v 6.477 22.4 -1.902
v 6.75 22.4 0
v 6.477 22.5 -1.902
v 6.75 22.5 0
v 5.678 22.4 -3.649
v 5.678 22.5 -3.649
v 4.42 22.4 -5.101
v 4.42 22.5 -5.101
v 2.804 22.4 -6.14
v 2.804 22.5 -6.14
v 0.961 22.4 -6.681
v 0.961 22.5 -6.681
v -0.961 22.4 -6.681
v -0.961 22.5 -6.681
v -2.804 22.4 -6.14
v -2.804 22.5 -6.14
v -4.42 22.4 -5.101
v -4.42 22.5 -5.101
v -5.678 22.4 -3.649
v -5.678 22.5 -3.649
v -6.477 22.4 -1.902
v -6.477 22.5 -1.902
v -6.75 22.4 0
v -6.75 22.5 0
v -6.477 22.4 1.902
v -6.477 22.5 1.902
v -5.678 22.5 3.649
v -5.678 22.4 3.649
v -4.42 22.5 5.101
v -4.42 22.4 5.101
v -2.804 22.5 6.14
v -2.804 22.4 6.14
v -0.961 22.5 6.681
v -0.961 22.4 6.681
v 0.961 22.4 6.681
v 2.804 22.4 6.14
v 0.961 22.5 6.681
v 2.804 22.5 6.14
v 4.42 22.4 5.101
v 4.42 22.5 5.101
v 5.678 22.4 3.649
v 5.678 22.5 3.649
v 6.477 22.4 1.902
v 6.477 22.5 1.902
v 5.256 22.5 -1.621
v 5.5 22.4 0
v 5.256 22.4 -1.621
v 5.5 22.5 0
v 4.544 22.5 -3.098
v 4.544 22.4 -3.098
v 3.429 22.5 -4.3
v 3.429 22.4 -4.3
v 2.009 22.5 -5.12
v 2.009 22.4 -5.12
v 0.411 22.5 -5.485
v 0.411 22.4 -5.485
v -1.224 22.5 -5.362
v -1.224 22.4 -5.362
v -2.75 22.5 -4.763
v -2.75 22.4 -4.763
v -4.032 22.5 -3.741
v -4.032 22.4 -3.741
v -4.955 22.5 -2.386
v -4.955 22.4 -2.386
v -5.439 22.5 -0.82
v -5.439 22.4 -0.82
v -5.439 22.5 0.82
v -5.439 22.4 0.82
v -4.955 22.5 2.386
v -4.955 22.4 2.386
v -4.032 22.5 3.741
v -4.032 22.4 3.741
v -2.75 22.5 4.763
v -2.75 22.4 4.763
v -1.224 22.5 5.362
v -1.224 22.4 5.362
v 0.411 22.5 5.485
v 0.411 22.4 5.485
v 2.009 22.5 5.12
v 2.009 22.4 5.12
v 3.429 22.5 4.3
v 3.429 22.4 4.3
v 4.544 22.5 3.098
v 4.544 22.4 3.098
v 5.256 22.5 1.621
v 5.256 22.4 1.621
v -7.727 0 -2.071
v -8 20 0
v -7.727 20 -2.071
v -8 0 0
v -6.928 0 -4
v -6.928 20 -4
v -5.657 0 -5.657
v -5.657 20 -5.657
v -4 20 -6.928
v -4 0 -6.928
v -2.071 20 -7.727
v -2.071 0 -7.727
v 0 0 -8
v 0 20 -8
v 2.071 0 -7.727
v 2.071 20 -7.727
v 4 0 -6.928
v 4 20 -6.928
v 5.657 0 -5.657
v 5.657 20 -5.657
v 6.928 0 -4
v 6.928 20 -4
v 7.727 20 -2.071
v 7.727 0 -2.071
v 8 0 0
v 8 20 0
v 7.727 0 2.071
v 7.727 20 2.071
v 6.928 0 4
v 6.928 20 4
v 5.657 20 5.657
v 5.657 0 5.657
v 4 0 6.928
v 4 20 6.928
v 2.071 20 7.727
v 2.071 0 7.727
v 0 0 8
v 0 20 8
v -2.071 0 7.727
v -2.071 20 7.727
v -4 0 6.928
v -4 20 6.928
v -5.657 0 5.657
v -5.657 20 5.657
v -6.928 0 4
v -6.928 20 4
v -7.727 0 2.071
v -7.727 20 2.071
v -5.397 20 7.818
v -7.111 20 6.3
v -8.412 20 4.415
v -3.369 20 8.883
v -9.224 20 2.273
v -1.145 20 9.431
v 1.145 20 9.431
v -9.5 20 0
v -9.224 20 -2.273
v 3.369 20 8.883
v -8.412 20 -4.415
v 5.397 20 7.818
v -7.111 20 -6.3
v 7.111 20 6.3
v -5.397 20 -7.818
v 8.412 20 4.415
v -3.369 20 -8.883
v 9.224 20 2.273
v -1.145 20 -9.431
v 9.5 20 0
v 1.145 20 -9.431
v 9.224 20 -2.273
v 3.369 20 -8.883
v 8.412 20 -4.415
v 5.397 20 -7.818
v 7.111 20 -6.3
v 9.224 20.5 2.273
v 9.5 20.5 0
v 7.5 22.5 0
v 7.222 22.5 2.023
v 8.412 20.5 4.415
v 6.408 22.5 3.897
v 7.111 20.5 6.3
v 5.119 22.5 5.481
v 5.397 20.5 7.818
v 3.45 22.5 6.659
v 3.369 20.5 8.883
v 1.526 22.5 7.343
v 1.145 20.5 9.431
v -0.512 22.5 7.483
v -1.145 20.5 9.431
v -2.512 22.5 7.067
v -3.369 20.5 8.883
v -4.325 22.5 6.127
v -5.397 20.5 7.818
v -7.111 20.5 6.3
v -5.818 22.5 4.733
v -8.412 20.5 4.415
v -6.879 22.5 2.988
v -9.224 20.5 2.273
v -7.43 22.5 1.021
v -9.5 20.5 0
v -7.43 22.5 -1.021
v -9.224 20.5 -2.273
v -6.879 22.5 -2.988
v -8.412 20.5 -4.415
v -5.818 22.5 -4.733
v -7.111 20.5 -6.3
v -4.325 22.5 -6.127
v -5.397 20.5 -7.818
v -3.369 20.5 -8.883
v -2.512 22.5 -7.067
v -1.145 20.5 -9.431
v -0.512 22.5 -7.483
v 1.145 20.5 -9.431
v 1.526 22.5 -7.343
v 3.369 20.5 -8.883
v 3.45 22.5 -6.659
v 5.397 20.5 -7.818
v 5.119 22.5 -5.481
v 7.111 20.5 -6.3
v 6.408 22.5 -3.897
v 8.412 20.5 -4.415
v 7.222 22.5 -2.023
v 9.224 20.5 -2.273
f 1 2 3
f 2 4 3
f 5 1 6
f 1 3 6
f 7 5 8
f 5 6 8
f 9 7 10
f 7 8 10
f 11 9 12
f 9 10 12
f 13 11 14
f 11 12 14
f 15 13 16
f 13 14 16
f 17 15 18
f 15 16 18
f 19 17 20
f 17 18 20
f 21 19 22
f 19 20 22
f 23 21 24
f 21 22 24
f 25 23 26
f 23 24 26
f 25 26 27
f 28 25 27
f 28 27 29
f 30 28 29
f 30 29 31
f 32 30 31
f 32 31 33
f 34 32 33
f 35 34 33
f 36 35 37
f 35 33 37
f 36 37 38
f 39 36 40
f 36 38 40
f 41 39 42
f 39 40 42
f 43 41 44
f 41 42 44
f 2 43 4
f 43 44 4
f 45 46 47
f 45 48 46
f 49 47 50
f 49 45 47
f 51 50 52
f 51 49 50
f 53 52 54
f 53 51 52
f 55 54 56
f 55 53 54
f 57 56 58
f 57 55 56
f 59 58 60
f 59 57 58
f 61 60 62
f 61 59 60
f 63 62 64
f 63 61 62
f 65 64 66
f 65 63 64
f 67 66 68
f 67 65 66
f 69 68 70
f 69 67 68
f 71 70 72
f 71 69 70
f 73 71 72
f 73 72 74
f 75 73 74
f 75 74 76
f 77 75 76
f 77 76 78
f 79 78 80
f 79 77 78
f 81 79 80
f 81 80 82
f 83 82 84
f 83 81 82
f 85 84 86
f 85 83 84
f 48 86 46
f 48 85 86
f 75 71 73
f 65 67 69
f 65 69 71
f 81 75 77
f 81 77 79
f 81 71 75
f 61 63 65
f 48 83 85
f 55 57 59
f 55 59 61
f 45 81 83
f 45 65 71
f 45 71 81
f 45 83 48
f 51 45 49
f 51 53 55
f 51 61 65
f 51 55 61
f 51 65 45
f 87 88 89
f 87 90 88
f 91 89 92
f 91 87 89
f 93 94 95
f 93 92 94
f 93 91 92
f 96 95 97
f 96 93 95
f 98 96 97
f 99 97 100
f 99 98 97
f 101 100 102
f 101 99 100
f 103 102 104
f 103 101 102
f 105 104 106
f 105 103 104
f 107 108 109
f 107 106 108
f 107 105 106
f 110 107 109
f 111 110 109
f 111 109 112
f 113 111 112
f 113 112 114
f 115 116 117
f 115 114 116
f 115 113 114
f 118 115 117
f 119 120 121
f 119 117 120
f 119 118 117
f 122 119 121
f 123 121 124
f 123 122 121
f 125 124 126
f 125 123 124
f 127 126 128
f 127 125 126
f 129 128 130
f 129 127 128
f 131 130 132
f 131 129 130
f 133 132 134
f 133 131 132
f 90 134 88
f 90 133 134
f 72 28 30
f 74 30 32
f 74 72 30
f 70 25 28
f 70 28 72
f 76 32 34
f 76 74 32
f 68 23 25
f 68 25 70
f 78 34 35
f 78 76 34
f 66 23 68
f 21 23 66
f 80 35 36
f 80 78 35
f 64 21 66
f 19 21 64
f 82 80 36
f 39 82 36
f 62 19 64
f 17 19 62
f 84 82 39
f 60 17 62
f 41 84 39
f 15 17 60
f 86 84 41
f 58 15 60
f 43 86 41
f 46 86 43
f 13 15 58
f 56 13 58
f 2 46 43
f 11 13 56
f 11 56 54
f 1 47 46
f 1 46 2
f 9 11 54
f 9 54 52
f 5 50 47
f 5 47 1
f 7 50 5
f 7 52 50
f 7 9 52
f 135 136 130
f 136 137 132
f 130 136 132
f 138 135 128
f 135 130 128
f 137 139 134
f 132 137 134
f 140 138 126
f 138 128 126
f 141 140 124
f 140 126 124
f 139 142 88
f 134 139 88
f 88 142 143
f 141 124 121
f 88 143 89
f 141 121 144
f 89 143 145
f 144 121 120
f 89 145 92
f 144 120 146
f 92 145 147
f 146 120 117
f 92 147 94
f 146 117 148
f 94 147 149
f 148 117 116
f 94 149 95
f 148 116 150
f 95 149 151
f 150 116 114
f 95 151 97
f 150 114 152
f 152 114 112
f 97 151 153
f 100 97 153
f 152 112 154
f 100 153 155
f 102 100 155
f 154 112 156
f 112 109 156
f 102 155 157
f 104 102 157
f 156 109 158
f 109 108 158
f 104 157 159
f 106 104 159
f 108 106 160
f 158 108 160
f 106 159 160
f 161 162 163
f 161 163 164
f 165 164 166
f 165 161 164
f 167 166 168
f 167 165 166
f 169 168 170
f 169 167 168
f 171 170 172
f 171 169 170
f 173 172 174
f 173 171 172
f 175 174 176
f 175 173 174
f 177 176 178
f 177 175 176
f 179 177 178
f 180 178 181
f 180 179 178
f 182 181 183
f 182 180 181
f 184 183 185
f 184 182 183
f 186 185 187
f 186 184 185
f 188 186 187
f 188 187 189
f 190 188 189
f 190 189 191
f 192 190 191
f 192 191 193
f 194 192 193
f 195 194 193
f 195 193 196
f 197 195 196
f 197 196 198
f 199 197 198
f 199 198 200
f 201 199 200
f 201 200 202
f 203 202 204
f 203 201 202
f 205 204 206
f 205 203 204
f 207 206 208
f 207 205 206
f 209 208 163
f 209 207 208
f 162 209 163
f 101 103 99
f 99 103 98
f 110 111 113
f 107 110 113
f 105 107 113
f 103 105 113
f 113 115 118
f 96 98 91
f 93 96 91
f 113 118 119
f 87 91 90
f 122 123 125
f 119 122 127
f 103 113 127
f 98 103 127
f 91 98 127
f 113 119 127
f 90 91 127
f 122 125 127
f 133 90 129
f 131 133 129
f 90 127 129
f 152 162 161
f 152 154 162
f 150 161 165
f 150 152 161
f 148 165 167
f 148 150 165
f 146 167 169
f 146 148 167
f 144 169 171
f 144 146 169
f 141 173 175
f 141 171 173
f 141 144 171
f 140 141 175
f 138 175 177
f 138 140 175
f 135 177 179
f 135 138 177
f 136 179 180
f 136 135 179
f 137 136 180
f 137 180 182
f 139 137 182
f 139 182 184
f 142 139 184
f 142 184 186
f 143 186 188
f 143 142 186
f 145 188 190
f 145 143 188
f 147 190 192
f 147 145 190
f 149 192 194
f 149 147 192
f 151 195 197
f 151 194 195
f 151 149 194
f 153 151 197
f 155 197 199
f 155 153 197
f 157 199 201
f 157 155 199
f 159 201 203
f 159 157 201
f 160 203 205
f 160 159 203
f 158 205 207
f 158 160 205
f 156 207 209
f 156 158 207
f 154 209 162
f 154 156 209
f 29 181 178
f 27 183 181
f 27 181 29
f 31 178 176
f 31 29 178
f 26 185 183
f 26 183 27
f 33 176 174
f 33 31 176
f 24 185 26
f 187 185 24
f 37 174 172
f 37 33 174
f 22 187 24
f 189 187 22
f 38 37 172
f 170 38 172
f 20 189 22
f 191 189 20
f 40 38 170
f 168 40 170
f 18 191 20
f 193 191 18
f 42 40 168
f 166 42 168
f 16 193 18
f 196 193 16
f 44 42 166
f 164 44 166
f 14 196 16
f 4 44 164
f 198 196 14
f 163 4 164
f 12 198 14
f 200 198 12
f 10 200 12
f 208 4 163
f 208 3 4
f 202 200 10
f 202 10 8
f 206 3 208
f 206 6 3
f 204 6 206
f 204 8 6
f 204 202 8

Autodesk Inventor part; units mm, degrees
ref_plane "YZ Plane" through (0, 0, 0) normal (1, 0, 0) x (0, 1, 0)
ref_plane "XZ Plane" through (0, 0, 0) normal (0, 1, 0) x (-1, 0, 0)
ref_plane "XY Plane" through (0, 0, 0) normal (0, 0, 1) x (1, 0, 0)
sketch "Sketch1" plane through (0, 0, 0) normal (0, 1, 0) x (-1, 0, 0)
  circle A0 centre (0, 0) radius 8
  dimension "d0" = 16
extrude "Extrusion1" add sketch "Sketch1" along normal blind 20
sketch "Sketch2" plane through (0, 20, 0) normal (0, 1, 0) x (1, 0, 0)
  circle A0 centre (0, 0) radius 9.5
  dimension "d3" = 19
extrude "Extrusion2" add sketch "Sketch2" along normal blind 2.5
chamfer "Chamfer1" distance 2 angle 45 1 edges at (-9.5, 22.5, 0)
sketch "Sketch3" plane through (0, 22.5, 0) normal (0, 1, 0) x (1, 0, 0)
  circle A0 centre (0, 0) radius 5.5
  circle A1 centre (0, 0) radius 6.75
  dimension "d9" = 11
  dimension "d10" = 13.5
extrude "Extrusion3" cut sketch "Sketch3" against normal blind 0.1
properties part number "16mm_switch"
